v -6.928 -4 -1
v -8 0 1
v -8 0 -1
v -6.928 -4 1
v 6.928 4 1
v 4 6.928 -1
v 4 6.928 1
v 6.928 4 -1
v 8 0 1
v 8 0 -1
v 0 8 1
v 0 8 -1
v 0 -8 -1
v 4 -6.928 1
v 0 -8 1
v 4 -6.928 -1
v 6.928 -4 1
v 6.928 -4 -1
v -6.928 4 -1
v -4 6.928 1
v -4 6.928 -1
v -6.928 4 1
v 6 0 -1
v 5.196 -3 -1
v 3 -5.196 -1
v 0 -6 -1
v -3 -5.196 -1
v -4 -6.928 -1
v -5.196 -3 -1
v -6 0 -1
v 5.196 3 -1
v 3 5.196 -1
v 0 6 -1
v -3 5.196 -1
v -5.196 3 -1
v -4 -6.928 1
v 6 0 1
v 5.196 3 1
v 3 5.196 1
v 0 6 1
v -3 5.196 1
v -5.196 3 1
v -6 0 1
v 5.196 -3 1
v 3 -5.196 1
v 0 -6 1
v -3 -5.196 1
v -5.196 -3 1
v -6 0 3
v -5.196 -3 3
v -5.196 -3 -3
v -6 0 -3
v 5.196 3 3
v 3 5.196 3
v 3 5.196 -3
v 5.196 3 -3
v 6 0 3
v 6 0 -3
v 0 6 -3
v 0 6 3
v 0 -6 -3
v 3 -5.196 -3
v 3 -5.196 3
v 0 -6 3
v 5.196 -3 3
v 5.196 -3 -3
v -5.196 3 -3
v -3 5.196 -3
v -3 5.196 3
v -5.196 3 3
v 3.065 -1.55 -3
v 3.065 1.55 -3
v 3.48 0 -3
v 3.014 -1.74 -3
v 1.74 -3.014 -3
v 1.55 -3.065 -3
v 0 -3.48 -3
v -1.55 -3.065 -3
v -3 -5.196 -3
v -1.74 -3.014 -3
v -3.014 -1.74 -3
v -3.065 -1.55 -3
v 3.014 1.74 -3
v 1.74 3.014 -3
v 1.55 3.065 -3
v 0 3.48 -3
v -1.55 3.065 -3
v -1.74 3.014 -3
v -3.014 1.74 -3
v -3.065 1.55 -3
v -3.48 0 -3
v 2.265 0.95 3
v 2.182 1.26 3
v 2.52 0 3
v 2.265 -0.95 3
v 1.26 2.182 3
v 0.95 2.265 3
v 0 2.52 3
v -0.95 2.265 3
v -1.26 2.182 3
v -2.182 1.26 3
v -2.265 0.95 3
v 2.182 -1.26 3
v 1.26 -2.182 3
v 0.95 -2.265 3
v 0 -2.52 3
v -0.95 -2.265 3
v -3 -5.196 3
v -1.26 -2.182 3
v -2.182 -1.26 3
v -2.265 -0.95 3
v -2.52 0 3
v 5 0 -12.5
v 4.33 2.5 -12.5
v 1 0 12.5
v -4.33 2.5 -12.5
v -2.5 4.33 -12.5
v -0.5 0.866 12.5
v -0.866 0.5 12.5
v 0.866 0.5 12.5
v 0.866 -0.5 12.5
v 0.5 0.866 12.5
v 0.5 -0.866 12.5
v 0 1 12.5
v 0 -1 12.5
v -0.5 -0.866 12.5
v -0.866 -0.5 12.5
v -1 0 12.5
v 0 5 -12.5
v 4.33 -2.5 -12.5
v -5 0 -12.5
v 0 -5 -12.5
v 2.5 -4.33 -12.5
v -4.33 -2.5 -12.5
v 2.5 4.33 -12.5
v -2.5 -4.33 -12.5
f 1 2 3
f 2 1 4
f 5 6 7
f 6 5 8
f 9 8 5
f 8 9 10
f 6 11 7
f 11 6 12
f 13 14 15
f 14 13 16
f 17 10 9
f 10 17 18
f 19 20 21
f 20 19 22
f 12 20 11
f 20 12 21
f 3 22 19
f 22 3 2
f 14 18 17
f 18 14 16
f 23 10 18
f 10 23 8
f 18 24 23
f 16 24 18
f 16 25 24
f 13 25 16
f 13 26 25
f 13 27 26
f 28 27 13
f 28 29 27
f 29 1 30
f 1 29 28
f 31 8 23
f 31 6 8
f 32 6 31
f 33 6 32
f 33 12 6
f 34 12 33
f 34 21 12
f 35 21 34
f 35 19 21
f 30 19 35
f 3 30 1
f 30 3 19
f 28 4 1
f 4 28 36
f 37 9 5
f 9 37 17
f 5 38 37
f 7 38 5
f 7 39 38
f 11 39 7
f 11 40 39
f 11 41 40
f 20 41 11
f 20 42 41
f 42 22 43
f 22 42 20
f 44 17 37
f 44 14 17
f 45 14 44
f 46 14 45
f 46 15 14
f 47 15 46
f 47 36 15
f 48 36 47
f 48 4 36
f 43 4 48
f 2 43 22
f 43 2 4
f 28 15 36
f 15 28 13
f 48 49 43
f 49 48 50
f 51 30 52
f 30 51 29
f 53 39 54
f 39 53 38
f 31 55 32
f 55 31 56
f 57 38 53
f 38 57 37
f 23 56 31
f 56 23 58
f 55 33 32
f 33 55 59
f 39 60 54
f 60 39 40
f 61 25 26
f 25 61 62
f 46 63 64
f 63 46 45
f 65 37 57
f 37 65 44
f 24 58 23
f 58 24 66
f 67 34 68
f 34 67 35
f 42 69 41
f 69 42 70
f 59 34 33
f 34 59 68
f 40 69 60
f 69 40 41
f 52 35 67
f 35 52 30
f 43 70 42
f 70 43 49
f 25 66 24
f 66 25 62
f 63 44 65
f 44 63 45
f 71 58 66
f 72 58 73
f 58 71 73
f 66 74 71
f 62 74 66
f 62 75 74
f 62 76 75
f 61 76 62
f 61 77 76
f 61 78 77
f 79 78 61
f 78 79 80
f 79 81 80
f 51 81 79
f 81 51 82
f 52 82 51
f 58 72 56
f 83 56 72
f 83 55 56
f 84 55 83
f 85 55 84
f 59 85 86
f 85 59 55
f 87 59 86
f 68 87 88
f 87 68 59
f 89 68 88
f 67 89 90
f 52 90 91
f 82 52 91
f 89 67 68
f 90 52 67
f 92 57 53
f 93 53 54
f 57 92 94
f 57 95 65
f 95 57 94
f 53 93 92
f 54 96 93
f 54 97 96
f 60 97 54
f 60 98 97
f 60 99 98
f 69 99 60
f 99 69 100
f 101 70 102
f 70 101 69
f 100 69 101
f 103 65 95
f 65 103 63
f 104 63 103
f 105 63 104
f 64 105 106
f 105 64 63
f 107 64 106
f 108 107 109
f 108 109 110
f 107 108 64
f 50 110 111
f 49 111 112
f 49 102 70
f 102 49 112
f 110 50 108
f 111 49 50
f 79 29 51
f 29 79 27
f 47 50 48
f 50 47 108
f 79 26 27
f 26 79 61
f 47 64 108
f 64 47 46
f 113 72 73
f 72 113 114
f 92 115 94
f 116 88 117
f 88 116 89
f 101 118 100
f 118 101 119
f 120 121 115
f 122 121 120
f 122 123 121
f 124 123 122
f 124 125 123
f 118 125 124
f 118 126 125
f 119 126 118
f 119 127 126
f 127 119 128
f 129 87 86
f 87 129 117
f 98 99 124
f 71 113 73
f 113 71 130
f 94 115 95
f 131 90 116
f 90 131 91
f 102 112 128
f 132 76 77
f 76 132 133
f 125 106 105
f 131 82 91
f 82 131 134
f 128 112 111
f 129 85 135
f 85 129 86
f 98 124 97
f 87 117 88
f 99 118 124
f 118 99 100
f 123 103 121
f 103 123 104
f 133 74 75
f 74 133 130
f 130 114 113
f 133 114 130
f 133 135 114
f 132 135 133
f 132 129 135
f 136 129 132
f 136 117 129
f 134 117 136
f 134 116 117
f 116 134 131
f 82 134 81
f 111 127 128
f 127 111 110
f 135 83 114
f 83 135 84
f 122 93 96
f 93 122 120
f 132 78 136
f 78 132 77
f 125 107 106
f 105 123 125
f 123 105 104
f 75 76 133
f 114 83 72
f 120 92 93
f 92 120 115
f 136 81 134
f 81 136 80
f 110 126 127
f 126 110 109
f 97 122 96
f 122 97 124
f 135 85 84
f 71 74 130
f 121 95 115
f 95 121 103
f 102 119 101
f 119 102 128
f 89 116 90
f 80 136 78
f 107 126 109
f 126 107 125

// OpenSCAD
$fn=12;
cylinder(25, 5, center=true);
mirror([0, 0, 1])
{
  cylinder(h=2, r=8, center=true);
  cylinder(h=6, d=12, center=true);
}
